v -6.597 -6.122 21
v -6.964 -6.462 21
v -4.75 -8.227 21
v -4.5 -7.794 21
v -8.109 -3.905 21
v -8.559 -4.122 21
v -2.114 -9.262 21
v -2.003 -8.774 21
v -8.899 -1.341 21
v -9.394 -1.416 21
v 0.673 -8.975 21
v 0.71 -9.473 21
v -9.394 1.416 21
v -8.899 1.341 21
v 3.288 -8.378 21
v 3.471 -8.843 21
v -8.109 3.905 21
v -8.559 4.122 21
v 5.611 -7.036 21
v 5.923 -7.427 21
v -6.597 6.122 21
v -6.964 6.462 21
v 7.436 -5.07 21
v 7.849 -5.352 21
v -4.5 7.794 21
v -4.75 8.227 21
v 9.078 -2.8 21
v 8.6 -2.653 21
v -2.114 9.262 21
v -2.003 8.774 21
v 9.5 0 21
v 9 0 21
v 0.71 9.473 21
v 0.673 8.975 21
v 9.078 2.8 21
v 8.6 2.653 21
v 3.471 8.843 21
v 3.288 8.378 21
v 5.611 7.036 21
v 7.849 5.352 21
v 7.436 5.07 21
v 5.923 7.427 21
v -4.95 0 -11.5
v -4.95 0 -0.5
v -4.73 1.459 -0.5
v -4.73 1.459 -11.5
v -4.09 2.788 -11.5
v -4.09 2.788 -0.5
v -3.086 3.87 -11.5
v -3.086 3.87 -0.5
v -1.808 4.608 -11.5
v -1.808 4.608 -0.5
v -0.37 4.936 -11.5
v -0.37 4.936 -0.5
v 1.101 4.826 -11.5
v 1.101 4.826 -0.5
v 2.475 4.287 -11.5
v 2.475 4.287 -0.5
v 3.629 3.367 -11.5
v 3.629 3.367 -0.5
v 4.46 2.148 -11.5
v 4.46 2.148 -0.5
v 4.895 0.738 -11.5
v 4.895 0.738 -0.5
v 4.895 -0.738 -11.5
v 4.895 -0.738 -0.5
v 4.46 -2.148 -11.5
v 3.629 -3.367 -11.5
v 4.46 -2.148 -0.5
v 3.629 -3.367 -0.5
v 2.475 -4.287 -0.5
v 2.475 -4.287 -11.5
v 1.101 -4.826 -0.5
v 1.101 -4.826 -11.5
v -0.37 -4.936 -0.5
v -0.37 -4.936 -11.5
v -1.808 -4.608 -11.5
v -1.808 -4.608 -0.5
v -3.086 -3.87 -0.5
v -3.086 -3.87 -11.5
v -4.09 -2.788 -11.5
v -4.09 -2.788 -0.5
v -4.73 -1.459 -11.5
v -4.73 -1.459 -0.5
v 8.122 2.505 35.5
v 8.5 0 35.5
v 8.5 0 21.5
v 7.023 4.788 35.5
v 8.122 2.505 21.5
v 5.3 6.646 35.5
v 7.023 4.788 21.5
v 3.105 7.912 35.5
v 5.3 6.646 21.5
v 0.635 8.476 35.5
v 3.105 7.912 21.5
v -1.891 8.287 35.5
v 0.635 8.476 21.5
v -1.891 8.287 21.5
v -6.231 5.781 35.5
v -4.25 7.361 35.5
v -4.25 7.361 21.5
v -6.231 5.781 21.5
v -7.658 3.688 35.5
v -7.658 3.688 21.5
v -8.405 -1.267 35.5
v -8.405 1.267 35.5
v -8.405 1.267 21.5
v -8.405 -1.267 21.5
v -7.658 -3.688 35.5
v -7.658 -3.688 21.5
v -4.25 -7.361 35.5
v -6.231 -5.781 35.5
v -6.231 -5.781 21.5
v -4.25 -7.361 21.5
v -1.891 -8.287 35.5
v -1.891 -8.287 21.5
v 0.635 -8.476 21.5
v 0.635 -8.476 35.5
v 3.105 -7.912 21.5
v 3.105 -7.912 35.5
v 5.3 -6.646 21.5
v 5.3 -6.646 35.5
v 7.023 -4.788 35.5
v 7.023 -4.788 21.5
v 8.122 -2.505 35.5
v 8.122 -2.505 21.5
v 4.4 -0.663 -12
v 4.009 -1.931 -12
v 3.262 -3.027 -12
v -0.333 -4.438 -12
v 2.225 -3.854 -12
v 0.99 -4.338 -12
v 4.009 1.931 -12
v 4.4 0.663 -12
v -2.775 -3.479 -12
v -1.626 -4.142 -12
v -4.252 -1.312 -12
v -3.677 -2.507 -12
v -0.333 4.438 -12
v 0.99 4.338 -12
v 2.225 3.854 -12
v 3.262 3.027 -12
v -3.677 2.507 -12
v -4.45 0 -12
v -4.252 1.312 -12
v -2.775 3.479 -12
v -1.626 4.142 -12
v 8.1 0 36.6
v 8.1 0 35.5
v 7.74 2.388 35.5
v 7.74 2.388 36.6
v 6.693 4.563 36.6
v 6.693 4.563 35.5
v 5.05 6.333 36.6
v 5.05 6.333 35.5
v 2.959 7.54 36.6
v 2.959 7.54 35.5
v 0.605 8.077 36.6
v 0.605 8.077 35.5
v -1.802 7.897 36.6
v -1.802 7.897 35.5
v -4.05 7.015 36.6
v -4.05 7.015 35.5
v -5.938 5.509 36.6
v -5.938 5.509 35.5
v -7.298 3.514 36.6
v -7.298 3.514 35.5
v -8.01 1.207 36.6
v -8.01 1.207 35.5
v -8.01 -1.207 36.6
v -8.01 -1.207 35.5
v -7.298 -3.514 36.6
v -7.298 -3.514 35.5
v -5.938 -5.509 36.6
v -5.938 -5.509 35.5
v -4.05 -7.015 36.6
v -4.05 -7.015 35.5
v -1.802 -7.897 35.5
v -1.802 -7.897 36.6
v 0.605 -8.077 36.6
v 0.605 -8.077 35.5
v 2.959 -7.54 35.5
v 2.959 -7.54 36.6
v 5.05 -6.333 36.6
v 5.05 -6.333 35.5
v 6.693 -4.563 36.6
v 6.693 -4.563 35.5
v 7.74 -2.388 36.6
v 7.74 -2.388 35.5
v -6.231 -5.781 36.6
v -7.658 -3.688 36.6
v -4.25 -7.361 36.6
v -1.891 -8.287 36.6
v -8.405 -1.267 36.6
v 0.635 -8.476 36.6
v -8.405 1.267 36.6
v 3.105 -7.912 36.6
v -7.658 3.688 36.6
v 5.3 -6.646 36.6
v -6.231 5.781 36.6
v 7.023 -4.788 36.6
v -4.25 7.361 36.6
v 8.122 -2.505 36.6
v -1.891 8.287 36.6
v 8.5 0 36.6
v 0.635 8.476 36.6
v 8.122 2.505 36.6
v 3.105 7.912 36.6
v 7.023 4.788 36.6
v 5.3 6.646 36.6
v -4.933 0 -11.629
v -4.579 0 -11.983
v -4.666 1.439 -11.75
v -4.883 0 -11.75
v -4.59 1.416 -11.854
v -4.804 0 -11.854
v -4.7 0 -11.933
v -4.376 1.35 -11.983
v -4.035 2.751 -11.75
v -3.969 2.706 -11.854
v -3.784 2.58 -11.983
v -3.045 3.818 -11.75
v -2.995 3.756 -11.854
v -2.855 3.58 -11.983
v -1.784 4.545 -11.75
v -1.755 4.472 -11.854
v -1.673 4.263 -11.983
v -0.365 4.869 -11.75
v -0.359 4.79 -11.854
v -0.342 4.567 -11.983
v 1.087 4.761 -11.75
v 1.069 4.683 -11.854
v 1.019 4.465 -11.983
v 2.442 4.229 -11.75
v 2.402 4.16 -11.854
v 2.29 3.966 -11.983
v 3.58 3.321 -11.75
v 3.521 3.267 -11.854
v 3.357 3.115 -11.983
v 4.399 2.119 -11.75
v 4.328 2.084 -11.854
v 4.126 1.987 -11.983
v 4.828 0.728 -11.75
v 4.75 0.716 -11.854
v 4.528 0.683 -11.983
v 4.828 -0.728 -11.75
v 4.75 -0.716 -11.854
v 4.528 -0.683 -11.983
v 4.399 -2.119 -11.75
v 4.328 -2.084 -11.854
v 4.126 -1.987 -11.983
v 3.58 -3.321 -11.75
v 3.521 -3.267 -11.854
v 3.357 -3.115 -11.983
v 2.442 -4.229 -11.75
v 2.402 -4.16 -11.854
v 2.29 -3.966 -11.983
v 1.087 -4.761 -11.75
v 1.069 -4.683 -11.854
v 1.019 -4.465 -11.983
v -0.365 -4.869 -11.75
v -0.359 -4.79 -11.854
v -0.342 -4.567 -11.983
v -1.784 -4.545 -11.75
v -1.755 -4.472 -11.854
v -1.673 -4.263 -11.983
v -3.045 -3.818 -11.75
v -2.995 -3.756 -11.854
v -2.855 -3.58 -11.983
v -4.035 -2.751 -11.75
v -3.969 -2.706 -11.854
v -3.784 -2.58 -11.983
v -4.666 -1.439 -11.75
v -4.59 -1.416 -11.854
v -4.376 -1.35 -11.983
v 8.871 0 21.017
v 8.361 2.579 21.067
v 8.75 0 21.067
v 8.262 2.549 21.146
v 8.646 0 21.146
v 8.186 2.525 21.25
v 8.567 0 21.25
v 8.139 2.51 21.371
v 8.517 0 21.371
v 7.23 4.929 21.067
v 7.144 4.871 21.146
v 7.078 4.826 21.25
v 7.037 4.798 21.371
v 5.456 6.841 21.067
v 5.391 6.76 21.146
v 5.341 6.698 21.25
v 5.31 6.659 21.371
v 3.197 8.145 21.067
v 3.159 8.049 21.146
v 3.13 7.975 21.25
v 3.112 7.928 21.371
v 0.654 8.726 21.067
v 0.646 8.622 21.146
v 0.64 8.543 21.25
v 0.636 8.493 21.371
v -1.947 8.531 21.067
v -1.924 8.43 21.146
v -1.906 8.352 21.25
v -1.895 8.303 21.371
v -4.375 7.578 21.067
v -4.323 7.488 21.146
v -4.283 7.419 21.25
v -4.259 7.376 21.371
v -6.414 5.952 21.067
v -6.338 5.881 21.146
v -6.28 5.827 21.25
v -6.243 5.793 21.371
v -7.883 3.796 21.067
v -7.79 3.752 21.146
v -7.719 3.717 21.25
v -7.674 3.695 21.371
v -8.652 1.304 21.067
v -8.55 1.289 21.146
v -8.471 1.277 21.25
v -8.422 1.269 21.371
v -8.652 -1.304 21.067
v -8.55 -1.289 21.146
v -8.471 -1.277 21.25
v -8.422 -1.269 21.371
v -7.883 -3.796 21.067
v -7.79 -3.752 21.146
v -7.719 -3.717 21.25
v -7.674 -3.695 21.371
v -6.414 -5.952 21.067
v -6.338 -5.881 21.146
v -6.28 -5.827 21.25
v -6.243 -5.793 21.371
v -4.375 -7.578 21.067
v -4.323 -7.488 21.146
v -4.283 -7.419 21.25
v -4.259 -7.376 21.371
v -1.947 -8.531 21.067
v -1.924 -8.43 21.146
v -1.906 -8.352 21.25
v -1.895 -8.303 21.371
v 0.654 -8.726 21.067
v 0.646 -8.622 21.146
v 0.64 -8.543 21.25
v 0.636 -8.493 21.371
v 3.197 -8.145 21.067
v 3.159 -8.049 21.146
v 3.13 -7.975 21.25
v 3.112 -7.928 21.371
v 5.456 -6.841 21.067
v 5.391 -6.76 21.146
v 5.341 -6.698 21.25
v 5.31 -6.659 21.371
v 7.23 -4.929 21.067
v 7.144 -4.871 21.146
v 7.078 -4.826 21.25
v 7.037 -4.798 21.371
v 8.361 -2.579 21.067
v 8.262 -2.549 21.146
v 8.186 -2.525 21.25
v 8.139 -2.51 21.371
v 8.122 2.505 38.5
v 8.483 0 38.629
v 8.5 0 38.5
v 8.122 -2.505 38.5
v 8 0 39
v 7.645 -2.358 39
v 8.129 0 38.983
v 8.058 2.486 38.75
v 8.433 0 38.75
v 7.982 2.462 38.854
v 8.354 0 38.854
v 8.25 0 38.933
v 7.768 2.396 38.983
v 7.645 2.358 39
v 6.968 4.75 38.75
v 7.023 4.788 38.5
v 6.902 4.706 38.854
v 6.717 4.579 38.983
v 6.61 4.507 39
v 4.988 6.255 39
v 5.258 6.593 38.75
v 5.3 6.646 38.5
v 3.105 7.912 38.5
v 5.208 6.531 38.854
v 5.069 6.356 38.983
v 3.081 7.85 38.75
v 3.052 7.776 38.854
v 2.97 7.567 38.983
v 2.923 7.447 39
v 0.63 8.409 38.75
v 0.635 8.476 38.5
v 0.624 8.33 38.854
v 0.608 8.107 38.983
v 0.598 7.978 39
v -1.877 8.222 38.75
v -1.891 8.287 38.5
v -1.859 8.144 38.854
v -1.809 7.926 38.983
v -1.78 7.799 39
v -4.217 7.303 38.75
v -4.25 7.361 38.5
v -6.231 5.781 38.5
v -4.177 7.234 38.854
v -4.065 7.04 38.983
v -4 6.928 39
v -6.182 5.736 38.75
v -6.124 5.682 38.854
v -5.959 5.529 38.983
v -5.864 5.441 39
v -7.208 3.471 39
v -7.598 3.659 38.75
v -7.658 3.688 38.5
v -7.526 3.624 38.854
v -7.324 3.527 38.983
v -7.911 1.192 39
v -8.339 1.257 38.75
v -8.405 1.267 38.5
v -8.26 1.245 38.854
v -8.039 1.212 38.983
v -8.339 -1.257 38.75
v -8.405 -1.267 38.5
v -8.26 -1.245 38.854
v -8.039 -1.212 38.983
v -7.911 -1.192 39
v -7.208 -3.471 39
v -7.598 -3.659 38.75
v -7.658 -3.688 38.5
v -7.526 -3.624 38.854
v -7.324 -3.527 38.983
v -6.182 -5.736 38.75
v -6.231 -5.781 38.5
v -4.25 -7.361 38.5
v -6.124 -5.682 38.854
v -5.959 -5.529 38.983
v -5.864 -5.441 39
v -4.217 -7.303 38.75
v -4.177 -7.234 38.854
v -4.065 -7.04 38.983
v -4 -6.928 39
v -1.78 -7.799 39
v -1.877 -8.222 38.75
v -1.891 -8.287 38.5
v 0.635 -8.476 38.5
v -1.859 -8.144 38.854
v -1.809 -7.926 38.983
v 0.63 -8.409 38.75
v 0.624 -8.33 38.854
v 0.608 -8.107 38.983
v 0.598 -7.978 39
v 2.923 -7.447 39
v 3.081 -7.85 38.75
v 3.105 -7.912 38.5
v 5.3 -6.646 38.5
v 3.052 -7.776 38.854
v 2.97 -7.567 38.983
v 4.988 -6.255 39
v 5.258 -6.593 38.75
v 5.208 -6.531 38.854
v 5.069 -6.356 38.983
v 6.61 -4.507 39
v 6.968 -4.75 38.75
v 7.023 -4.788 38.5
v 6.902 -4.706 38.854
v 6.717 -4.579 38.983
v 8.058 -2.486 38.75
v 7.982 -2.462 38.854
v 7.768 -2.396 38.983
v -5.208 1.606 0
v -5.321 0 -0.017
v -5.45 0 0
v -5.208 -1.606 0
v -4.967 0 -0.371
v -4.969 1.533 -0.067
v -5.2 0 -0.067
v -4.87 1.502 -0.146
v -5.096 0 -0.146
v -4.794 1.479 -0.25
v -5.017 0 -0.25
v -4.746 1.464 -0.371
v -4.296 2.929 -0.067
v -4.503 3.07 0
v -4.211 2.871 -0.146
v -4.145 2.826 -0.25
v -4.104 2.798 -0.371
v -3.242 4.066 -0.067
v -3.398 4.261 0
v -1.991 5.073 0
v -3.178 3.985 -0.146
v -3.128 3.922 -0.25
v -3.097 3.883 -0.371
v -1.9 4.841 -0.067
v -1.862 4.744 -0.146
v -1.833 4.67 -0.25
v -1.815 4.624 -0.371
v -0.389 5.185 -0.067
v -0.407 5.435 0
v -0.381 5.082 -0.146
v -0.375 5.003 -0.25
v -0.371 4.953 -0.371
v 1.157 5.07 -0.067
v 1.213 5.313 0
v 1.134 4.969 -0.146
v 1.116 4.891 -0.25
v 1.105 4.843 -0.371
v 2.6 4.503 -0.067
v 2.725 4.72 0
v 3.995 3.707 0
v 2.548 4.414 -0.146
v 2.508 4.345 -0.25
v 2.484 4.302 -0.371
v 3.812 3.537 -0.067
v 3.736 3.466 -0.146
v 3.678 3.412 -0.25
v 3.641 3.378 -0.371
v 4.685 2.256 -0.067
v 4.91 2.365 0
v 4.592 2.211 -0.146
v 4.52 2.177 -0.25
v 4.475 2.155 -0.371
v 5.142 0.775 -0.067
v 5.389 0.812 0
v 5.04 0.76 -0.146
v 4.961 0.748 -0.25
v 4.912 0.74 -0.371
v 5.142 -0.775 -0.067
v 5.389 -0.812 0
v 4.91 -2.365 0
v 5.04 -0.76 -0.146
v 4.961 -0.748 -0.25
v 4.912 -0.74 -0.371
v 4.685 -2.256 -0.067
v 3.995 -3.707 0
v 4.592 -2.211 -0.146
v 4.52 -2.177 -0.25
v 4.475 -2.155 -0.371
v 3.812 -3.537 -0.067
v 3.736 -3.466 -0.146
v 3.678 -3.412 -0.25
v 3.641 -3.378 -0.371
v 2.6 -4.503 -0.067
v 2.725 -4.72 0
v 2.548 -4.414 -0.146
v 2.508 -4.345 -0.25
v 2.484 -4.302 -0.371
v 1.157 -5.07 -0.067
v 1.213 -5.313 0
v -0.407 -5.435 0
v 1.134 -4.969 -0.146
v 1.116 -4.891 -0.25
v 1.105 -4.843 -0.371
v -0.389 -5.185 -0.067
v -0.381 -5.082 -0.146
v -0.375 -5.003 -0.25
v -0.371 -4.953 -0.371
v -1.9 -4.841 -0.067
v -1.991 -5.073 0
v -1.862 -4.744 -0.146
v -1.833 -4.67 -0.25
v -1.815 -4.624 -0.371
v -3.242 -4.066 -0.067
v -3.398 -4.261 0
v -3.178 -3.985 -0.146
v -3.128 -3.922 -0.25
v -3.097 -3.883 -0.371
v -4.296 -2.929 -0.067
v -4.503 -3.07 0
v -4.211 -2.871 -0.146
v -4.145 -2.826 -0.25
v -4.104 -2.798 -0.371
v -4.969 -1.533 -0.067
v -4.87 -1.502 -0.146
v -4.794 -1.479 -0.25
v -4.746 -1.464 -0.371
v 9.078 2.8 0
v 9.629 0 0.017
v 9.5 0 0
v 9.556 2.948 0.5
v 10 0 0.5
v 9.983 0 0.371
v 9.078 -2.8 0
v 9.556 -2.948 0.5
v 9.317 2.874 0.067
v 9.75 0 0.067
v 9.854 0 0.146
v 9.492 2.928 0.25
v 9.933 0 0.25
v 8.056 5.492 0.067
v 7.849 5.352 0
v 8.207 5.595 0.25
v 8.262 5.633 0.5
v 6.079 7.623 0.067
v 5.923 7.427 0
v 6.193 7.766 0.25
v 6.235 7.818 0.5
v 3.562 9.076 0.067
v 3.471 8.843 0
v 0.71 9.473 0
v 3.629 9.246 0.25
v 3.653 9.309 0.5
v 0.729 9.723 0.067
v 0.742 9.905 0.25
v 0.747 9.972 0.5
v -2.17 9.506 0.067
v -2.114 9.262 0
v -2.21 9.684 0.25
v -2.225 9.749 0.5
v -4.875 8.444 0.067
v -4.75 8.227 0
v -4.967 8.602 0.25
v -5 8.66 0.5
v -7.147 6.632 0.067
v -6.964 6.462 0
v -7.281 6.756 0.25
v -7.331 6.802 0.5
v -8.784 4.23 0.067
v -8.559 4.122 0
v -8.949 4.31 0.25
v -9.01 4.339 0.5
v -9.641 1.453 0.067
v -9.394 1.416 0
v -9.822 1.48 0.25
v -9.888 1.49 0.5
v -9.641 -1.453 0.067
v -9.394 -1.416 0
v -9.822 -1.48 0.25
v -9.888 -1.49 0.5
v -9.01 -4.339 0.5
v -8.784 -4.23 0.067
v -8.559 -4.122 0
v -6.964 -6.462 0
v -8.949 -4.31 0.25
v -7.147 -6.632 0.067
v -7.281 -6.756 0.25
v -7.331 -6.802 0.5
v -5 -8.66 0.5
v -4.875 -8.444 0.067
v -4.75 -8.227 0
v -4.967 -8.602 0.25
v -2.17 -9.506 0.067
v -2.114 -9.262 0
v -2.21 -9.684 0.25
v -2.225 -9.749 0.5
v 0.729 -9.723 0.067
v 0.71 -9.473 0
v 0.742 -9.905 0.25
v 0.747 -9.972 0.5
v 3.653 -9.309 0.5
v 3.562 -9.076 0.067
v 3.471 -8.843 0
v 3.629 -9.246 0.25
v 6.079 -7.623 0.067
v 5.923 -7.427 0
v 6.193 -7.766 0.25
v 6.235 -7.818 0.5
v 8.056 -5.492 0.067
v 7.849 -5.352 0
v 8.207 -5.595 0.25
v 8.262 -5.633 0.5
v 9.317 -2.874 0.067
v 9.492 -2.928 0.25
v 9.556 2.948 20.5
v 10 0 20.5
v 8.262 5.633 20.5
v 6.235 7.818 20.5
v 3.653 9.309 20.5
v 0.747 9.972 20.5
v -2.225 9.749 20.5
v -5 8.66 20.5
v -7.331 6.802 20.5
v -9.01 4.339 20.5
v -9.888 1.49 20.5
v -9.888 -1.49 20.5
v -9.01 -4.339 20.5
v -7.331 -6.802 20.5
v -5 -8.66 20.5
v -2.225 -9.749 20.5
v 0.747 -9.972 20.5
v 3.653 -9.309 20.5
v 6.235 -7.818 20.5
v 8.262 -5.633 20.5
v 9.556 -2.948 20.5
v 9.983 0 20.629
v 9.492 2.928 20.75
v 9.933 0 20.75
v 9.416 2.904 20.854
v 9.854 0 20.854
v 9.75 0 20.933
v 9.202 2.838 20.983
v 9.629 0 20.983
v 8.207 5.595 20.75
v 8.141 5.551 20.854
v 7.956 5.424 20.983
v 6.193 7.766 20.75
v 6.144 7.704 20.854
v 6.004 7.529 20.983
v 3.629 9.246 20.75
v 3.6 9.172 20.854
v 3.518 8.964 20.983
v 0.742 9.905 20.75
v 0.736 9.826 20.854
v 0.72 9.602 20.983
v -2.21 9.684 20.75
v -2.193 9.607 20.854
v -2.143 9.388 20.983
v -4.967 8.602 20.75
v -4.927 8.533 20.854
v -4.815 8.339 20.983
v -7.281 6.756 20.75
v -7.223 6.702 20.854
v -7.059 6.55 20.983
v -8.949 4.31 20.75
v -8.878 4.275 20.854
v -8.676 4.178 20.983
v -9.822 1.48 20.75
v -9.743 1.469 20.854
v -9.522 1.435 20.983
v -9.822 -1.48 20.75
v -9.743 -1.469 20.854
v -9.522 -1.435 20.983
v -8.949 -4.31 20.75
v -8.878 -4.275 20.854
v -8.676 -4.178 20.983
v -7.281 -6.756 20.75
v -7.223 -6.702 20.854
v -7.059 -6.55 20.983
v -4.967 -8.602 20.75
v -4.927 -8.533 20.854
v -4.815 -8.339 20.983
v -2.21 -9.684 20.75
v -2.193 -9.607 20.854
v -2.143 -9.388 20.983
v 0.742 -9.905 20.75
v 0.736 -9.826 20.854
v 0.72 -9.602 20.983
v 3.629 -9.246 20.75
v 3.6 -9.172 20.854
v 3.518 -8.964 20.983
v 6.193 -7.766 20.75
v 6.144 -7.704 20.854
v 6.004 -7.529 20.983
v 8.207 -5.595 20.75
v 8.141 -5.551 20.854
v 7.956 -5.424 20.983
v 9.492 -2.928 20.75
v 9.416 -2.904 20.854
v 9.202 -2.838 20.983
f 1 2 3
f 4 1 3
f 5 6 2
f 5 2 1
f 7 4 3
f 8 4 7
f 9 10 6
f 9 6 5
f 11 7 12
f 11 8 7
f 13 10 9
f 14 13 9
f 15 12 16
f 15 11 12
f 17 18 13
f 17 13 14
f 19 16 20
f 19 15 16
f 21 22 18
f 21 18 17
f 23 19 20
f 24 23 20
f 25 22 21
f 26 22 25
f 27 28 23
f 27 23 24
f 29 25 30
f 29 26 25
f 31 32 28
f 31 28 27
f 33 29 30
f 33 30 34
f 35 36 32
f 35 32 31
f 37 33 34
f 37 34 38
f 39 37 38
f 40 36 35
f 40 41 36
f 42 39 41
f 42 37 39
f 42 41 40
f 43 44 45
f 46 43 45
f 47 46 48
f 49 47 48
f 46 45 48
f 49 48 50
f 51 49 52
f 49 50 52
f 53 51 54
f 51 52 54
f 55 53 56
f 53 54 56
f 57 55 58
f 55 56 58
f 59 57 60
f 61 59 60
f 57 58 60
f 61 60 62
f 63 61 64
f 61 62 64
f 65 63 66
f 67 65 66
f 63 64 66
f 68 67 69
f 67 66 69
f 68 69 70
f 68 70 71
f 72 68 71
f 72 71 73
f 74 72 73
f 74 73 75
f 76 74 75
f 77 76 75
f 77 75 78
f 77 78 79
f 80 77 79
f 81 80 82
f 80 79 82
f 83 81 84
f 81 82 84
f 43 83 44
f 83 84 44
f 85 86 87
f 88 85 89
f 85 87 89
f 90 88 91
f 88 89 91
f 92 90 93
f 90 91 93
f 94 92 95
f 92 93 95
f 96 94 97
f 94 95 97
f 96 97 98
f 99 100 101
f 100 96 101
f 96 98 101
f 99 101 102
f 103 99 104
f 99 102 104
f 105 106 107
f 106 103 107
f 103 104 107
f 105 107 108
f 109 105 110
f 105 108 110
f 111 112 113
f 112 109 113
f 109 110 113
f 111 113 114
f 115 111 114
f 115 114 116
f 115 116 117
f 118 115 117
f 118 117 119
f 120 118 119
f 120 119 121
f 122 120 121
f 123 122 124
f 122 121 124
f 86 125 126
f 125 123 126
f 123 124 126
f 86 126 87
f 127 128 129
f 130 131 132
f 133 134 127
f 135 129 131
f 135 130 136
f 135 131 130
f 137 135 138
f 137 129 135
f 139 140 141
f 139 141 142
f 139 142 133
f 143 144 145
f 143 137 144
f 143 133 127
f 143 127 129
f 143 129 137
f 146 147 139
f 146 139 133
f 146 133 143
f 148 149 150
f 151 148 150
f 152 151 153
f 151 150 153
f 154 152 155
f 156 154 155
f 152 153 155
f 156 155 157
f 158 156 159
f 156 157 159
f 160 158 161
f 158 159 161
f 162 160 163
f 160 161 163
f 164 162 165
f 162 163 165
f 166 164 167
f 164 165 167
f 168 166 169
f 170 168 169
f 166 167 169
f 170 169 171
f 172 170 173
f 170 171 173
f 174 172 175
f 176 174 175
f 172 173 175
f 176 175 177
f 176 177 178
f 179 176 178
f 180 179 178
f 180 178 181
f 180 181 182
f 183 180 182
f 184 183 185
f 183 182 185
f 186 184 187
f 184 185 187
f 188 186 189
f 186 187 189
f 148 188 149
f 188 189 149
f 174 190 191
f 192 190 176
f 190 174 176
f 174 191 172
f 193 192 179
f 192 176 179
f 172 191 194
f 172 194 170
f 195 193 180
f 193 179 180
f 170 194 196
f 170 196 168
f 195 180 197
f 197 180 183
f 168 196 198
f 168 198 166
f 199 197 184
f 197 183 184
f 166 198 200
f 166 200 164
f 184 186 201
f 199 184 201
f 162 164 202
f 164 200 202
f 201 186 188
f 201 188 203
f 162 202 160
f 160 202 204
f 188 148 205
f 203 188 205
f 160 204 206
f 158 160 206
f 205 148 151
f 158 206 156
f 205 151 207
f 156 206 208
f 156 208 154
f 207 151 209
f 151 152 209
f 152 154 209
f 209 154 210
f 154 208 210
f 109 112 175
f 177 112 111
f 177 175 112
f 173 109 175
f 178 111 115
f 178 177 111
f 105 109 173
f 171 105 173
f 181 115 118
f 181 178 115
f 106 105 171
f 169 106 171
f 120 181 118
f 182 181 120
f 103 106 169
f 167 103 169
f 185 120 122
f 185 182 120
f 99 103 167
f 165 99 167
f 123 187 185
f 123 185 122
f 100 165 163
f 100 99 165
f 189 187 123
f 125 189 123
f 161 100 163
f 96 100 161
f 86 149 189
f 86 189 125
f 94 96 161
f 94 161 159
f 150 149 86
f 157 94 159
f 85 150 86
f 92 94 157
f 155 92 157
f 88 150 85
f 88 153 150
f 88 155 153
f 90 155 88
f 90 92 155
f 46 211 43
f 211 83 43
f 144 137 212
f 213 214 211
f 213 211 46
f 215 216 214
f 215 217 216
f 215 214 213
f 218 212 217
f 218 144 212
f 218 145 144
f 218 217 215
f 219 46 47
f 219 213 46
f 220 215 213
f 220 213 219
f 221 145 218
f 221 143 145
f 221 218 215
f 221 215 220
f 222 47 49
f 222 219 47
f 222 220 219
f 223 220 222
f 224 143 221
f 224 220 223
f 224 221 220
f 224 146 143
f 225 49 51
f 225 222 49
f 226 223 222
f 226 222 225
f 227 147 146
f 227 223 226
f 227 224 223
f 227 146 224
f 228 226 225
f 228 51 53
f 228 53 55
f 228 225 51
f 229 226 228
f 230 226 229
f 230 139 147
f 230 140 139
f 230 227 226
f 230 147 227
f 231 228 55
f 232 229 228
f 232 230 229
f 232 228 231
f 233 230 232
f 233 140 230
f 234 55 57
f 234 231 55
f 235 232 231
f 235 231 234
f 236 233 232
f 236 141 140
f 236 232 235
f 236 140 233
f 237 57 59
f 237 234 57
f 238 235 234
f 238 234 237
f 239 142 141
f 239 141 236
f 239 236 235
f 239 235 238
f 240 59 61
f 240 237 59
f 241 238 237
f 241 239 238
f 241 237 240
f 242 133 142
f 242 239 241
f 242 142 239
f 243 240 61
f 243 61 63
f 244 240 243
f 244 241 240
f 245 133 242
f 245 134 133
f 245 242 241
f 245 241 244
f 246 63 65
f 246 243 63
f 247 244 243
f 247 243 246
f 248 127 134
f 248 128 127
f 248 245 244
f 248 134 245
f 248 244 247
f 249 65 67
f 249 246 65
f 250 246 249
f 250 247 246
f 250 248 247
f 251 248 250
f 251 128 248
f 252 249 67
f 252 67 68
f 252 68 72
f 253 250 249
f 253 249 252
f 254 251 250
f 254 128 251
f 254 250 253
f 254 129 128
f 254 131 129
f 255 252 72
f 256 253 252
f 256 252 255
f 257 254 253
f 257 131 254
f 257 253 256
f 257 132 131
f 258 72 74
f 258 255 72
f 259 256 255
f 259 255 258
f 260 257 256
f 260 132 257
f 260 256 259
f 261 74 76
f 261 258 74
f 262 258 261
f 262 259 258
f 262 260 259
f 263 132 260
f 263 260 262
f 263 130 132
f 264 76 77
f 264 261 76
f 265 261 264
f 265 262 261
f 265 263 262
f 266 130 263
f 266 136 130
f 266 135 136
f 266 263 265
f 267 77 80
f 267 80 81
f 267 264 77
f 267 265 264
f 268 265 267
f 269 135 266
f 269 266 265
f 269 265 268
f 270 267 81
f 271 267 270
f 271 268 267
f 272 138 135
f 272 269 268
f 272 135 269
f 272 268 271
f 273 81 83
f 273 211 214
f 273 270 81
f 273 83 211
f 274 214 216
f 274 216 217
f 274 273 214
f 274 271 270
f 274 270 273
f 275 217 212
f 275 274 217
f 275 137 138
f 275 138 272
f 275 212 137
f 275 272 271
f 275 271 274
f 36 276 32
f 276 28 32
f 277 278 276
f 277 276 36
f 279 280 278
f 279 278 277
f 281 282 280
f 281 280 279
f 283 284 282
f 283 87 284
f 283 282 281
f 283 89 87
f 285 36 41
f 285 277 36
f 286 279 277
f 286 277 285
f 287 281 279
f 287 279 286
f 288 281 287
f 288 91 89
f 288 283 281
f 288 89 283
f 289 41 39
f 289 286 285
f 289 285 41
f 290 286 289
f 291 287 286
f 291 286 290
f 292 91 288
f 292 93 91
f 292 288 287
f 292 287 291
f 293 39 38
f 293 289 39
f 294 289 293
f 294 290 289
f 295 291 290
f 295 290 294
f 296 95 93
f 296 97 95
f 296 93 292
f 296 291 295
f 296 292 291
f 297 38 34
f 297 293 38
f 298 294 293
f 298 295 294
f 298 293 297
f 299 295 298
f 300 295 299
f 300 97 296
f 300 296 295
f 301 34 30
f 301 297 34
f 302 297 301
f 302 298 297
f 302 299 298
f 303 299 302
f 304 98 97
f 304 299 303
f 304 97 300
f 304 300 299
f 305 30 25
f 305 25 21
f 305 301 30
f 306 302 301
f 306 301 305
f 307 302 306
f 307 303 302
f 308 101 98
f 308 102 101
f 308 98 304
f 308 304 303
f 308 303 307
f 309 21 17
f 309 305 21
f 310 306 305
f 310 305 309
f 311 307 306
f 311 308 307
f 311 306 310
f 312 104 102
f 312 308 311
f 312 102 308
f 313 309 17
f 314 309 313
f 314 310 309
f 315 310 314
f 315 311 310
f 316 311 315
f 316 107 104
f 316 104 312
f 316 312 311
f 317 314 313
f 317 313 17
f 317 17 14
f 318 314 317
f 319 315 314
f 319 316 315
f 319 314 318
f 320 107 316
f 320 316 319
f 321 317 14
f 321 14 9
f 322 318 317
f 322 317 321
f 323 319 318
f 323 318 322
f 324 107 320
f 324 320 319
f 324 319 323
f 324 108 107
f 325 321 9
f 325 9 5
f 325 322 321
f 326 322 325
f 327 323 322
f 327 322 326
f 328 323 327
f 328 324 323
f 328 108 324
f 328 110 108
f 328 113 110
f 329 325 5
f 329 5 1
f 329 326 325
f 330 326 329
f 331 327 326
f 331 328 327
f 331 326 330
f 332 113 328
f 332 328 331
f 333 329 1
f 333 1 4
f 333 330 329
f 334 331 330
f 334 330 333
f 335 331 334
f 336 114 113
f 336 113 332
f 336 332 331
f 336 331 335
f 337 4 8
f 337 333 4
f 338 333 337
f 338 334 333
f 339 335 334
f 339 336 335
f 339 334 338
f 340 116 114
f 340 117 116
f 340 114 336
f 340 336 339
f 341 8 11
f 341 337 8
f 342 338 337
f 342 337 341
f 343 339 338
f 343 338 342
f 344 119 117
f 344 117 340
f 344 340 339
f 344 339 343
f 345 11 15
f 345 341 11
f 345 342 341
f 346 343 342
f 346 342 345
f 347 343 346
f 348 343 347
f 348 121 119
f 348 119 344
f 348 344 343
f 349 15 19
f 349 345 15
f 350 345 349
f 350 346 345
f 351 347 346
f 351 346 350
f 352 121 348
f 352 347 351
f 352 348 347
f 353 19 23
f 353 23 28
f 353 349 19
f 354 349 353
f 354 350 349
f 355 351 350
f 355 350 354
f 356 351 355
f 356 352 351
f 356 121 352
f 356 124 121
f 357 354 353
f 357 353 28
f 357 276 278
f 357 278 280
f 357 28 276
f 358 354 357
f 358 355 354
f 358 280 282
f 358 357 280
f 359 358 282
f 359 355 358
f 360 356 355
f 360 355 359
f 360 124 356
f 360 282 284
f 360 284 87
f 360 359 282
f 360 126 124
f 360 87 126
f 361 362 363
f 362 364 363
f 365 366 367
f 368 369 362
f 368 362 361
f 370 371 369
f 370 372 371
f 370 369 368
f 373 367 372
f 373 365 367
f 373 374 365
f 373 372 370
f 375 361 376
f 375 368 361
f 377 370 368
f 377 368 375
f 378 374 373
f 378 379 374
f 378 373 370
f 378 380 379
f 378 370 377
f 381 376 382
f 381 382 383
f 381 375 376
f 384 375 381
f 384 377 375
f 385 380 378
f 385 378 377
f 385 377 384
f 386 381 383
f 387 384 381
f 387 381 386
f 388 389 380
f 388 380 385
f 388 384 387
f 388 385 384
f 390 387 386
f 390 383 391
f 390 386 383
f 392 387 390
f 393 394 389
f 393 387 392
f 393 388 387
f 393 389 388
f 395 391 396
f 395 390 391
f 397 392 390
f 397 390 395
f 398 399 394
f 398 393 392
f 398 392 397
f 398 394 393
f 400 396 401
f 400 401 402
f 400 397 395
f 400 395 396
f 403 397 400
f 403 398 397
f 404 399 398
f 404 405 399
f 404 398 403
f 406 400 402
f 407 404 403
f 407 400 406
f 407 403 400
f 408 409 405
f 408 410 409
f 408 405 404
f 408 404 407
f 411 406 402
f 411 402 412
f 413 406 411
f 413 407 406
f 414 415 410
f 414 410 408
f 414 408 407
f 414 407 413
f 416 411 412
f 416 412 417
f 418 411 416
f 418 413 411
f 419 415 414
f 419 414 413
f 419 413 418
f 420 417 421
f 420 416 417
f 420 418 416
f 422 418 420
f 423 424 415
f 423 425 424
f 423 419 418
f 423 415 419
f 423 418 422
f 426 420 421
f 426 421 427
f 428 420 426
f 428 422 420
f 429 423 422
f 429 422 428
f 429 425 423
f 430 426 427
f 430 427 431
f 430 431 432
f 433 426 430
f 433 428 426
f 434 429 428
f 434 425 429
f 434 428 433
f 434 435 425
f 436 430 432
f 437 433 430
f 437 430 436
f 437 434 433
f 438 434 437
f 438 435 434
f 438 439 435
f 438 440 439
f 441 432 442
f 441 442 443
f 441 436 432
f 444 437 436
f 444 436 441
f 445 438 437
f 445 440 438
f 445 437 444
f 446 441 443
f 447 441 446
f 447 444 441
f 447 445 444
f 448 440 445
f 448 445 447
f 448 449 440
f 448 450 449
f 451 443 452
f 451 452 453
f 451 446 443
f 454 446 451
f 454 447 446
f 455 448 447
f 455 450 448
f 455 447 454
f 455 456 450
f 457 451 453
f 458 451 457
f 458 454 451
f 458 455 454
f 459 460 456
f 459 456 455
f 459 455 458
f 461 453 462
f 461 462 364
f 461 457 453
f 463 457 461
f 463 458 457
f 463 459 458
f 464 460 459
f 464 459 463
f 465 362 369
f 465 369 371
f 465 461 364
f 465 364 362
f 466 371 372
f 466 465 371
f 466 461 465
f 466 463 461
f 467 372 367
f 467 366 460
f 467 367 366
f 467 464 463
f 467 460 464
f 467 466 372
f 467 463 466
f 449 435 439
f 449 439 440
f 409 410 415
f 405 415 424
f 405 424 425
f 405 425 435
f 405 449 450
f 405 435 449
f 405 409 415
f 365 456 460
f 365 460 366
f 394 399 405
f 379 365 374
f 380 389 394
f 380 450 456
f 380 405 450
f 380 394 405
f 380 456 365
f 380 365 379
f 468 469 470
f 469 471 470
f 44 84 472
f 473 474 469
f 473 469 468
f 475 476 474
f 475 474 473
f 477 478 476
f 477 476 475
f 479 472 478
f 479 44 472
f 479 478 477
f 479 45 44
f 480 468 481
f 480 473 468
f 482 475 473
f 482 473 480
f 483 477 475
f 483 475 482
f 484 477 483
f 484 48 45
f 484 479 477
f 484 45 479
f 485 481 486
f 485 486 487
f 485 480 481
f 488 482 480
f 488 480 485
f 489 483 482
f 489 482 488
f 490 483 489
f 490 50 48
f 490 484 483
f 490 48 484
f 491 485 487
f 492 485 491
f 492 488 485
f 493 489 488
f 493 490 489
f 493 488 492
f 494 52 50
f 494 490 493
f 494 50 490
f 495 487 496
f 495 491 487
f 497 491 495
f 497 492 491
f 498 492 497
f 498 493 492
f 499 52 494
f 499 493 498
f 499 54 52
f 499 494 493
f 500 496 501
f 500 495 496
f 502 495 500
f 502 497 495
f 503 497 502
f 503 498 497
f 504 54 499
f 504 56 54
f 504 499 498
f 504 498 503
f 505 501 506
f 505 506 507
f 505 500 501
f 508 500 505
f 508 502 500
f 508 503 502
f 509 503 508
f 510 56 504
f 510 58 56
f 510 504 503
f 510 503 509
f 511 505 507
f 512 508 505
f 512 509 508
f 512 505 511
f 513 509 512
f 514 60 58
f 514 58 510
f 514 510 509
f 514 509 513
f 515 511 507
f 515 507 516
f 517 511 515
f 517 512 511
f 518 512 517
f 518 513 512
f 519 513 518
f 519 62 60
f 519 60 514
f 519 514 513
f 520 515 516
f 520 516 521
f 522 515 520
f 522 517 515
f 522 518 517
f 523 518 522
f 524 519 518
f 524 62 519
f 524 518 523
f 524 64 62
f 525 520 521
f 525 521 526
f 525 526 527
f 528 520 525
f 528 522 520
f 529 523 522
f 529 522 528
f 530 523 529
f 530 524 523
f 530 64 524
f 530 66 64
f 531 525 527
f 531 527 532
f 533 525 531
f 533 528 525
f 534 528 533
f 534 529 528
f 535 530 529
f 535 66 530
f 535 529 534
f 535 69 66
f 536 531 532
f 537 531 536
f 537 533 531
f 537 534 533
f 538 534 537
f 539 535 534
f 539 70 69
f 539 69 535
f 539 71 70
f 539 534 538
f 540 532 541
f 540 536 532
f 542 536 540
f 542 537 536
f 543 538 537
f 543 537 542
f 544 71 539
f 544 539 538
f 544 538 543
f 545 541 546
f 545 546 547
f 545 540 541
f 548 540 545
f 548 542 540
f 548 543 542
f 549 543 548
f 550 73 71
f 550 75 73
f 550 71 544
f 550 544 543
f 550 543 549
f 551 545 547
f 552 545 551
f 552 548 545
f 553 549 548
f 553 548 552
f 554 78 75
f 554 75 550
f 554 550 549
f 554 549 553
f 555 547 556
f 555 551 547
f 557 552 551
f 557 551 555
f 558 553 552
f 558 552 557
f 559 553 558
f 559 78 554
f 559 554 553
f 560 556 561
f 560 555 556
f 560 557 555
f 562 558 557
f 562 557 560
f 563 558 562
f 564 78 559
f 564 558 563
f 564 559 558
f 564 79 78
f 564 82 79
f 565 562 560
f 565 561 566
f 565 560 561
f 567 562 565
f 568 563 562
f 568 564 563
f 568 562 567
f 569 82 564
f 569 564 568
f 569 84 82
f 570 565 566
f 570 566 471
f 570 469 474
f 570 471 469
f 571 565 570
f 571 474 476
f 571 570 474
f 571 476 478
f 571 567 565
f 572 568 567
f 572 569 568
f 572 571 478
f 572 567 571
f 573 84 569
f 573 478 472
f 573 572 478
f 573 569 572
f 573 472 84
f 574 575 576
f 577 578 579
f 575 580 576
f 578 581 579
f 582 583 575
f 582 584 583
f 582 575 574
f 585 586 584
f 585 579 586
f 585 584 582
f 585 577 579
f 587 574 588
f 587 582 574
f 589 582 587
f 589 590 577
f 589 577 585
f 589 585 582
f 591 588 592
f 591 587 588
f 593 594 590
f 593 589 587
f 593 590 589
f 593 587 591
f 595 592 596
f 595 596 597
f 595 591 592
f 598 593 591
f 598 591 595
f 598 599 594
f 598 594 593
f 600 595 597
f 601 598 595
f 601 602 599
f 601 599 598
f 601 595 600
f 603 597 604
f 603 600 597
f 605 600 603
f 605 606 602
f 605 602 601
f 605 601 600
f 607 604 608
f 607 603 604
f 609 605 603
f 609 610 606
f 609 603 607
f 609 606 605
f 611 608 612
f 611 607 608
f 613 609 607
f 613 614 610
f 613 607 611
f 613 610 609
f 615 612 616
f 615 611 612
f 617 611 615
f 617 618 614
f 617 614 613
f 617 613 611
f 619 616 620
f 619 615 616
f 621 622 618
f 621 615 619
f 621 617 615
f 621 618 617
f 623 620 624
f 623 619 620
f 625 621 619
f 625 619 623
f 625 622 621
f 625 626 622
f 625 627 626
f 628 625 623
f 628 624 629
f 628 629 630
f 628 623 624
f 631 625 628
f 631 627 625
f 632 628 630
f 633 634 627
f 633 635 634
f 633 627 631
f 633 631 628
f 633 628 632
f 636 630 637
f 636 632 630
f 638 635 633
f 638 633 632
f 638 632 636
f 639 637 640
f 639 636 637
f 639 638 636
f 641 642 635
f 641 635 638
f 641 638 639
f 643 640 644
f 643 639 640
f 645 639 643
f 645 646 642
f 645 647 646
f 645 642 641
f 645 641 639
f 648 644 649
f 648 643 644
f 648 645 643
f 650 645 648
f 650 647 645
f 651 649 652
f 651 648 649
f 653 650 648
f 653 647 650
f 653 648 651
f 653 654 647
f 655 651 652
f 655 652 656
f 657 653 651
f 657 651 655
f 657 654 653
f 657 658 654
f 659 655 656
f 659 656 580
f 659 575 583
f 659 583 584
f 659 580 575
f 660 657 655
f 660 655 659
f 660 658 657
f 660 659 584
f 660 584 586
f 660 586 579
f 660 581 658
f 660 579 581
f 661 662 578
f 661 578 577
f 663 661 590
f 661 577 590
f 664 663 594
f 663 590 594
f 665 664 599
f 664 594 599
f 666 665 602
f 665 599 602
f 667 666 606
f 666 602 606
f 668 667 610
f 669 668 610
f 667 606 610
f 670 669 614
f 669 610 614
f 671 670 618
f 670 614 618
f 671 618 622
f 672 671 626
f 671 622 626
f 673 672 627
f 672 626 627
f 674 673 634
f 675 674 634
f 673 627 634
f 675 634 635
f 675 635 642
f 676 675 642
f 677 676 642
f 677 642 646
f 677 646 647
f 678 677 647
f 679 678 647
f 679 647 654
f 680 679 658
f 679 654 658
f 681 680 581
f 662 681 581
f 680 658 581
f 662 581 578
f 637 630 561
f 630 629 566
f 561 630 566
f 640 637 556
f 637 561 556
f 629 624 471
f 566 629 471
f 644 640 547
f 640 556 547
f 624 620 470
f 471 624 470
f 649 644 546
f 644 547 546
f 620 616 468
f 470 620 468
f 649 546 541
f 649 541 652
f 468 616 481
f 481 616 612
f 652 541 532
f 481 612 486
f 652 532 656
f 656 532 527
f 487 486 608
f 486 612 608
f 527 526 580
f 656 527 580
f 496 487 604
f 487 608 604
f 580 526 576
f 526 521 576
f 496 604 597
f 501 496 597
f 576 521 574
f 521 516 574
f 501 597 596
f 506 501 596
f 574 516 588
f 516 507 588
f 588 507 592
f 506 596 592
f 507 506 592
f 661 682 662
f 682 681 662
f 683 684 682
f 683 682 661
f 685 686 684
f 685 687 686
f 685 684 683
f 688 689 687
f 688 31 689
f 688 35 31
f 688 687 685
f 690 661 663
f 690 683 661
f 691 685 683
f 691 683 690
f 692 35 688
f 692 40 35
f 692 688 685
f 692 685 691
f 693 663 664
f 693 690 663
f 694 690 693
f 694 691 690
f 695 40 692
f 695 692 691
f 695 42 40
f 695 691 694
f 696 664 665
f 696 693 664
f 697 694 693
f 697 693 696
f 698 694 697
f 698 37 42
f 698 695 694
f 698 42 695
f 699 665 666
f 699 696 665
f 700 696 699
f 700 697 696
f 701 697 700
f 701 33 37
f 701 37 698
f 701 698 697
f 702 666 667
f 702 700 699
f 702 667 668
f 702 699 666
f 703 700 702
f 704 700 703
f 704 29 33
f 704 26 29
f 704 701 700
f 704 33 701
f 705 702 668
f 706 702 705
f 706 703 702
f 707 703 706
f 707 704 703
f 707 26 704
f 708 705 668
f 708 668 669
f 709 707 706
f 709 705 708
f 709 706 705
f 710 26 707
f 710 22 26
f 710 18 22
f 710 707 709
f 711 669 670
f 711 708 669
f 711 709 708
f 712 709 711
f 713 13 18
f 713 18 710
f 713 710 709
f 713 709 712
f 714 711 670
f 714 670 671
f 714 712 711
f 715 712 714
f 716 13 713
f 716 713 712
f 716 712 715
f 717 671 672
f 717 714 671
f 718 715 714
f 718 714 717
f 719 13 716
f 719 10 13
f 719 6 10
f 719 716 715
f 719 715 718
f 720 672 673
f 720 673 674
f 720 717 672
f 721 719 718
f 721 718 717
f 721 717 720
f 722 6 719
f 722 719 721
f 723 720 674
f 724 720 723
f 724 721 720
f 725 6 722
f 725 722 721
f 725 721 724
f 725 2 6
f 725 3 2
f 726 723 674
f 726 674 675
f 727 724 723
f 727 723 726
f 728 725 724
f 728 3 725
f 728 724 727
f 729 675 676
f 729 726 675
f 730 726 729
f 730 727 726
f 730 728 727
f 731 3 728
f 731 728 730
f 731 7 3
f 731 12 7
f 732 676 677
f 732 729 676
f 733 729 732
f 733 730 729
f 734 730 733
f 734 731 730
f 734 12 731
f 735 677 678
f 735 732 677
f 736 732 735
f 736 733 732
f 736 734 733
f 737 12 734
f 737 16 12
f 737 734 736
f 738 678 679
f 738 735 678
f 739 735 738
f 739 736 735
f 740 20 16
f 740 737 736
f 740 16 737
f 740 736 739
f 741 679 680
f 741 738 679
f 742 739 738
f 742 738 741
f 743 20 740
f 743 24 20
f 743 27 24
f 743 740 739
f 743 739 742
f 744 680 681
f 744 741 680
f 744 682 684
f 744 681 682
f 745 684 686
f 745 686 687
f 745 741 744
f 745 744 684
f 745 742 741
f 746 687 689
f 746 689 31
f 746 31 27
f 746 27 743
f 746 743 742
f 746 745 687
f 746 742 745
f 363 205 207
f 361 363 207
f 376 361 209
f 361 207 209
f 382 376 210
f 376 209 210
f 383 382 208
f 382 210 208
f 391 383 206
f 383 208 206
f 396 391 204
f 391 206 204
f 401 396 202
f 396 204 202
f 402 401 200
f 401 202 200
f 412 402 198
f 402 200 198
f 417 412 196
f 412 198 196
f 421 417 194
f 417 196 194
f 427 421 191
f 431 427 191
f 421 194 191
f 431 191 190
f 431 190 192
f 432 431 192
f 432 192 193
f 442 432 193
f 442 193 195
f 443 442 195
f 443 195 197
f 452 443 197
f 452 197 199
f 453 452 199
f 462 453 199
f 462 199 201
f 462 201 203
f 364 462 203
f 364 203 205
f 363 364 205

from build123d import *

# Parameters (mm, degrees)
SKETCH_1_R          = 10
EXTRUDE_1_DEPTH     = 21
SKETCH_2_R          = 8.5
EXTRUDE_2_DEPTH     = 18
SKETCH_3_R          = 4.95
EXTRUDE_3_DEPTH     = 12
FILLET_1_R          = 0.5
FILLET_2_R          = 0.5
SKETCH_4_OUTSIDE_W  = 33.664
SKETCH_4_OUTSIDE_H  = 33.664
SKETCH_4_OUTSIDE_R  = 8.1
CUT_EXTRUDE_1_DEPTH = 1.1


with BuildPart() as part:
    # 草图1 → 凸台-拉伸1 (new body)
    with BuildSketch(Plane.XY):
        Circle(SKETCH_1_R)
    extrude(amount=EXTRUDE_1_DEPTH)

    # 草图2 → 凸台-拉伸2 (add)
    with BuildSketch(Plane.XY.offset(21)):
        Circle(SKETCH_2_R)
    extrude(amount=EXTRUDE_2_DEPTH)

    # 草图3 → 凸台-拉伸3 (add)
    with BuildSketch(Plane(origin=(0, 0, 0), x_dir=(-1, 0, 0), z_dir=(0, 0, -1))):
        Circle(SKETCH_3_R)
    extrude(amount=EXTRUDE_3_DEPTH)

    # 圆角1
    fillet_1_edges = [part.edges().sort_by_distance(p)[0] for p in [
        (-8.5, 0, 21),
        (4.95, 0, 0),
    ]]
    fillet(fillet_1_edges, radius=FILLET_1_R)

    # 圆角2
    fillet_2_edges = [part.edges().sort_by_distance(p)[0] for p in [
        (4.95, 0, -12),
        (-10, 0, 0),
        (-10, 0, 21),
        (-8.5, 0, 39),
    ]]
    fillet(fillet_2_edges, radius=FILLET_2_R)

    # 草图4 outside → 切除-拉伸1 (cut)
    with BuildSketch(Plane.XY.offset(35.5)):
        Rectangle(SKETCH_4_OUTSIDE_W, SKETCH_4_OUTSIDE_H)
        Circle(SKETCH_4_OUTSIDE_R, mode=Mode.SUBTRACT)
    extrude(amount=CUT_EXTRUDE_1_DEPTH, mode=Mode.SUBTRACT)


solid = part.part
